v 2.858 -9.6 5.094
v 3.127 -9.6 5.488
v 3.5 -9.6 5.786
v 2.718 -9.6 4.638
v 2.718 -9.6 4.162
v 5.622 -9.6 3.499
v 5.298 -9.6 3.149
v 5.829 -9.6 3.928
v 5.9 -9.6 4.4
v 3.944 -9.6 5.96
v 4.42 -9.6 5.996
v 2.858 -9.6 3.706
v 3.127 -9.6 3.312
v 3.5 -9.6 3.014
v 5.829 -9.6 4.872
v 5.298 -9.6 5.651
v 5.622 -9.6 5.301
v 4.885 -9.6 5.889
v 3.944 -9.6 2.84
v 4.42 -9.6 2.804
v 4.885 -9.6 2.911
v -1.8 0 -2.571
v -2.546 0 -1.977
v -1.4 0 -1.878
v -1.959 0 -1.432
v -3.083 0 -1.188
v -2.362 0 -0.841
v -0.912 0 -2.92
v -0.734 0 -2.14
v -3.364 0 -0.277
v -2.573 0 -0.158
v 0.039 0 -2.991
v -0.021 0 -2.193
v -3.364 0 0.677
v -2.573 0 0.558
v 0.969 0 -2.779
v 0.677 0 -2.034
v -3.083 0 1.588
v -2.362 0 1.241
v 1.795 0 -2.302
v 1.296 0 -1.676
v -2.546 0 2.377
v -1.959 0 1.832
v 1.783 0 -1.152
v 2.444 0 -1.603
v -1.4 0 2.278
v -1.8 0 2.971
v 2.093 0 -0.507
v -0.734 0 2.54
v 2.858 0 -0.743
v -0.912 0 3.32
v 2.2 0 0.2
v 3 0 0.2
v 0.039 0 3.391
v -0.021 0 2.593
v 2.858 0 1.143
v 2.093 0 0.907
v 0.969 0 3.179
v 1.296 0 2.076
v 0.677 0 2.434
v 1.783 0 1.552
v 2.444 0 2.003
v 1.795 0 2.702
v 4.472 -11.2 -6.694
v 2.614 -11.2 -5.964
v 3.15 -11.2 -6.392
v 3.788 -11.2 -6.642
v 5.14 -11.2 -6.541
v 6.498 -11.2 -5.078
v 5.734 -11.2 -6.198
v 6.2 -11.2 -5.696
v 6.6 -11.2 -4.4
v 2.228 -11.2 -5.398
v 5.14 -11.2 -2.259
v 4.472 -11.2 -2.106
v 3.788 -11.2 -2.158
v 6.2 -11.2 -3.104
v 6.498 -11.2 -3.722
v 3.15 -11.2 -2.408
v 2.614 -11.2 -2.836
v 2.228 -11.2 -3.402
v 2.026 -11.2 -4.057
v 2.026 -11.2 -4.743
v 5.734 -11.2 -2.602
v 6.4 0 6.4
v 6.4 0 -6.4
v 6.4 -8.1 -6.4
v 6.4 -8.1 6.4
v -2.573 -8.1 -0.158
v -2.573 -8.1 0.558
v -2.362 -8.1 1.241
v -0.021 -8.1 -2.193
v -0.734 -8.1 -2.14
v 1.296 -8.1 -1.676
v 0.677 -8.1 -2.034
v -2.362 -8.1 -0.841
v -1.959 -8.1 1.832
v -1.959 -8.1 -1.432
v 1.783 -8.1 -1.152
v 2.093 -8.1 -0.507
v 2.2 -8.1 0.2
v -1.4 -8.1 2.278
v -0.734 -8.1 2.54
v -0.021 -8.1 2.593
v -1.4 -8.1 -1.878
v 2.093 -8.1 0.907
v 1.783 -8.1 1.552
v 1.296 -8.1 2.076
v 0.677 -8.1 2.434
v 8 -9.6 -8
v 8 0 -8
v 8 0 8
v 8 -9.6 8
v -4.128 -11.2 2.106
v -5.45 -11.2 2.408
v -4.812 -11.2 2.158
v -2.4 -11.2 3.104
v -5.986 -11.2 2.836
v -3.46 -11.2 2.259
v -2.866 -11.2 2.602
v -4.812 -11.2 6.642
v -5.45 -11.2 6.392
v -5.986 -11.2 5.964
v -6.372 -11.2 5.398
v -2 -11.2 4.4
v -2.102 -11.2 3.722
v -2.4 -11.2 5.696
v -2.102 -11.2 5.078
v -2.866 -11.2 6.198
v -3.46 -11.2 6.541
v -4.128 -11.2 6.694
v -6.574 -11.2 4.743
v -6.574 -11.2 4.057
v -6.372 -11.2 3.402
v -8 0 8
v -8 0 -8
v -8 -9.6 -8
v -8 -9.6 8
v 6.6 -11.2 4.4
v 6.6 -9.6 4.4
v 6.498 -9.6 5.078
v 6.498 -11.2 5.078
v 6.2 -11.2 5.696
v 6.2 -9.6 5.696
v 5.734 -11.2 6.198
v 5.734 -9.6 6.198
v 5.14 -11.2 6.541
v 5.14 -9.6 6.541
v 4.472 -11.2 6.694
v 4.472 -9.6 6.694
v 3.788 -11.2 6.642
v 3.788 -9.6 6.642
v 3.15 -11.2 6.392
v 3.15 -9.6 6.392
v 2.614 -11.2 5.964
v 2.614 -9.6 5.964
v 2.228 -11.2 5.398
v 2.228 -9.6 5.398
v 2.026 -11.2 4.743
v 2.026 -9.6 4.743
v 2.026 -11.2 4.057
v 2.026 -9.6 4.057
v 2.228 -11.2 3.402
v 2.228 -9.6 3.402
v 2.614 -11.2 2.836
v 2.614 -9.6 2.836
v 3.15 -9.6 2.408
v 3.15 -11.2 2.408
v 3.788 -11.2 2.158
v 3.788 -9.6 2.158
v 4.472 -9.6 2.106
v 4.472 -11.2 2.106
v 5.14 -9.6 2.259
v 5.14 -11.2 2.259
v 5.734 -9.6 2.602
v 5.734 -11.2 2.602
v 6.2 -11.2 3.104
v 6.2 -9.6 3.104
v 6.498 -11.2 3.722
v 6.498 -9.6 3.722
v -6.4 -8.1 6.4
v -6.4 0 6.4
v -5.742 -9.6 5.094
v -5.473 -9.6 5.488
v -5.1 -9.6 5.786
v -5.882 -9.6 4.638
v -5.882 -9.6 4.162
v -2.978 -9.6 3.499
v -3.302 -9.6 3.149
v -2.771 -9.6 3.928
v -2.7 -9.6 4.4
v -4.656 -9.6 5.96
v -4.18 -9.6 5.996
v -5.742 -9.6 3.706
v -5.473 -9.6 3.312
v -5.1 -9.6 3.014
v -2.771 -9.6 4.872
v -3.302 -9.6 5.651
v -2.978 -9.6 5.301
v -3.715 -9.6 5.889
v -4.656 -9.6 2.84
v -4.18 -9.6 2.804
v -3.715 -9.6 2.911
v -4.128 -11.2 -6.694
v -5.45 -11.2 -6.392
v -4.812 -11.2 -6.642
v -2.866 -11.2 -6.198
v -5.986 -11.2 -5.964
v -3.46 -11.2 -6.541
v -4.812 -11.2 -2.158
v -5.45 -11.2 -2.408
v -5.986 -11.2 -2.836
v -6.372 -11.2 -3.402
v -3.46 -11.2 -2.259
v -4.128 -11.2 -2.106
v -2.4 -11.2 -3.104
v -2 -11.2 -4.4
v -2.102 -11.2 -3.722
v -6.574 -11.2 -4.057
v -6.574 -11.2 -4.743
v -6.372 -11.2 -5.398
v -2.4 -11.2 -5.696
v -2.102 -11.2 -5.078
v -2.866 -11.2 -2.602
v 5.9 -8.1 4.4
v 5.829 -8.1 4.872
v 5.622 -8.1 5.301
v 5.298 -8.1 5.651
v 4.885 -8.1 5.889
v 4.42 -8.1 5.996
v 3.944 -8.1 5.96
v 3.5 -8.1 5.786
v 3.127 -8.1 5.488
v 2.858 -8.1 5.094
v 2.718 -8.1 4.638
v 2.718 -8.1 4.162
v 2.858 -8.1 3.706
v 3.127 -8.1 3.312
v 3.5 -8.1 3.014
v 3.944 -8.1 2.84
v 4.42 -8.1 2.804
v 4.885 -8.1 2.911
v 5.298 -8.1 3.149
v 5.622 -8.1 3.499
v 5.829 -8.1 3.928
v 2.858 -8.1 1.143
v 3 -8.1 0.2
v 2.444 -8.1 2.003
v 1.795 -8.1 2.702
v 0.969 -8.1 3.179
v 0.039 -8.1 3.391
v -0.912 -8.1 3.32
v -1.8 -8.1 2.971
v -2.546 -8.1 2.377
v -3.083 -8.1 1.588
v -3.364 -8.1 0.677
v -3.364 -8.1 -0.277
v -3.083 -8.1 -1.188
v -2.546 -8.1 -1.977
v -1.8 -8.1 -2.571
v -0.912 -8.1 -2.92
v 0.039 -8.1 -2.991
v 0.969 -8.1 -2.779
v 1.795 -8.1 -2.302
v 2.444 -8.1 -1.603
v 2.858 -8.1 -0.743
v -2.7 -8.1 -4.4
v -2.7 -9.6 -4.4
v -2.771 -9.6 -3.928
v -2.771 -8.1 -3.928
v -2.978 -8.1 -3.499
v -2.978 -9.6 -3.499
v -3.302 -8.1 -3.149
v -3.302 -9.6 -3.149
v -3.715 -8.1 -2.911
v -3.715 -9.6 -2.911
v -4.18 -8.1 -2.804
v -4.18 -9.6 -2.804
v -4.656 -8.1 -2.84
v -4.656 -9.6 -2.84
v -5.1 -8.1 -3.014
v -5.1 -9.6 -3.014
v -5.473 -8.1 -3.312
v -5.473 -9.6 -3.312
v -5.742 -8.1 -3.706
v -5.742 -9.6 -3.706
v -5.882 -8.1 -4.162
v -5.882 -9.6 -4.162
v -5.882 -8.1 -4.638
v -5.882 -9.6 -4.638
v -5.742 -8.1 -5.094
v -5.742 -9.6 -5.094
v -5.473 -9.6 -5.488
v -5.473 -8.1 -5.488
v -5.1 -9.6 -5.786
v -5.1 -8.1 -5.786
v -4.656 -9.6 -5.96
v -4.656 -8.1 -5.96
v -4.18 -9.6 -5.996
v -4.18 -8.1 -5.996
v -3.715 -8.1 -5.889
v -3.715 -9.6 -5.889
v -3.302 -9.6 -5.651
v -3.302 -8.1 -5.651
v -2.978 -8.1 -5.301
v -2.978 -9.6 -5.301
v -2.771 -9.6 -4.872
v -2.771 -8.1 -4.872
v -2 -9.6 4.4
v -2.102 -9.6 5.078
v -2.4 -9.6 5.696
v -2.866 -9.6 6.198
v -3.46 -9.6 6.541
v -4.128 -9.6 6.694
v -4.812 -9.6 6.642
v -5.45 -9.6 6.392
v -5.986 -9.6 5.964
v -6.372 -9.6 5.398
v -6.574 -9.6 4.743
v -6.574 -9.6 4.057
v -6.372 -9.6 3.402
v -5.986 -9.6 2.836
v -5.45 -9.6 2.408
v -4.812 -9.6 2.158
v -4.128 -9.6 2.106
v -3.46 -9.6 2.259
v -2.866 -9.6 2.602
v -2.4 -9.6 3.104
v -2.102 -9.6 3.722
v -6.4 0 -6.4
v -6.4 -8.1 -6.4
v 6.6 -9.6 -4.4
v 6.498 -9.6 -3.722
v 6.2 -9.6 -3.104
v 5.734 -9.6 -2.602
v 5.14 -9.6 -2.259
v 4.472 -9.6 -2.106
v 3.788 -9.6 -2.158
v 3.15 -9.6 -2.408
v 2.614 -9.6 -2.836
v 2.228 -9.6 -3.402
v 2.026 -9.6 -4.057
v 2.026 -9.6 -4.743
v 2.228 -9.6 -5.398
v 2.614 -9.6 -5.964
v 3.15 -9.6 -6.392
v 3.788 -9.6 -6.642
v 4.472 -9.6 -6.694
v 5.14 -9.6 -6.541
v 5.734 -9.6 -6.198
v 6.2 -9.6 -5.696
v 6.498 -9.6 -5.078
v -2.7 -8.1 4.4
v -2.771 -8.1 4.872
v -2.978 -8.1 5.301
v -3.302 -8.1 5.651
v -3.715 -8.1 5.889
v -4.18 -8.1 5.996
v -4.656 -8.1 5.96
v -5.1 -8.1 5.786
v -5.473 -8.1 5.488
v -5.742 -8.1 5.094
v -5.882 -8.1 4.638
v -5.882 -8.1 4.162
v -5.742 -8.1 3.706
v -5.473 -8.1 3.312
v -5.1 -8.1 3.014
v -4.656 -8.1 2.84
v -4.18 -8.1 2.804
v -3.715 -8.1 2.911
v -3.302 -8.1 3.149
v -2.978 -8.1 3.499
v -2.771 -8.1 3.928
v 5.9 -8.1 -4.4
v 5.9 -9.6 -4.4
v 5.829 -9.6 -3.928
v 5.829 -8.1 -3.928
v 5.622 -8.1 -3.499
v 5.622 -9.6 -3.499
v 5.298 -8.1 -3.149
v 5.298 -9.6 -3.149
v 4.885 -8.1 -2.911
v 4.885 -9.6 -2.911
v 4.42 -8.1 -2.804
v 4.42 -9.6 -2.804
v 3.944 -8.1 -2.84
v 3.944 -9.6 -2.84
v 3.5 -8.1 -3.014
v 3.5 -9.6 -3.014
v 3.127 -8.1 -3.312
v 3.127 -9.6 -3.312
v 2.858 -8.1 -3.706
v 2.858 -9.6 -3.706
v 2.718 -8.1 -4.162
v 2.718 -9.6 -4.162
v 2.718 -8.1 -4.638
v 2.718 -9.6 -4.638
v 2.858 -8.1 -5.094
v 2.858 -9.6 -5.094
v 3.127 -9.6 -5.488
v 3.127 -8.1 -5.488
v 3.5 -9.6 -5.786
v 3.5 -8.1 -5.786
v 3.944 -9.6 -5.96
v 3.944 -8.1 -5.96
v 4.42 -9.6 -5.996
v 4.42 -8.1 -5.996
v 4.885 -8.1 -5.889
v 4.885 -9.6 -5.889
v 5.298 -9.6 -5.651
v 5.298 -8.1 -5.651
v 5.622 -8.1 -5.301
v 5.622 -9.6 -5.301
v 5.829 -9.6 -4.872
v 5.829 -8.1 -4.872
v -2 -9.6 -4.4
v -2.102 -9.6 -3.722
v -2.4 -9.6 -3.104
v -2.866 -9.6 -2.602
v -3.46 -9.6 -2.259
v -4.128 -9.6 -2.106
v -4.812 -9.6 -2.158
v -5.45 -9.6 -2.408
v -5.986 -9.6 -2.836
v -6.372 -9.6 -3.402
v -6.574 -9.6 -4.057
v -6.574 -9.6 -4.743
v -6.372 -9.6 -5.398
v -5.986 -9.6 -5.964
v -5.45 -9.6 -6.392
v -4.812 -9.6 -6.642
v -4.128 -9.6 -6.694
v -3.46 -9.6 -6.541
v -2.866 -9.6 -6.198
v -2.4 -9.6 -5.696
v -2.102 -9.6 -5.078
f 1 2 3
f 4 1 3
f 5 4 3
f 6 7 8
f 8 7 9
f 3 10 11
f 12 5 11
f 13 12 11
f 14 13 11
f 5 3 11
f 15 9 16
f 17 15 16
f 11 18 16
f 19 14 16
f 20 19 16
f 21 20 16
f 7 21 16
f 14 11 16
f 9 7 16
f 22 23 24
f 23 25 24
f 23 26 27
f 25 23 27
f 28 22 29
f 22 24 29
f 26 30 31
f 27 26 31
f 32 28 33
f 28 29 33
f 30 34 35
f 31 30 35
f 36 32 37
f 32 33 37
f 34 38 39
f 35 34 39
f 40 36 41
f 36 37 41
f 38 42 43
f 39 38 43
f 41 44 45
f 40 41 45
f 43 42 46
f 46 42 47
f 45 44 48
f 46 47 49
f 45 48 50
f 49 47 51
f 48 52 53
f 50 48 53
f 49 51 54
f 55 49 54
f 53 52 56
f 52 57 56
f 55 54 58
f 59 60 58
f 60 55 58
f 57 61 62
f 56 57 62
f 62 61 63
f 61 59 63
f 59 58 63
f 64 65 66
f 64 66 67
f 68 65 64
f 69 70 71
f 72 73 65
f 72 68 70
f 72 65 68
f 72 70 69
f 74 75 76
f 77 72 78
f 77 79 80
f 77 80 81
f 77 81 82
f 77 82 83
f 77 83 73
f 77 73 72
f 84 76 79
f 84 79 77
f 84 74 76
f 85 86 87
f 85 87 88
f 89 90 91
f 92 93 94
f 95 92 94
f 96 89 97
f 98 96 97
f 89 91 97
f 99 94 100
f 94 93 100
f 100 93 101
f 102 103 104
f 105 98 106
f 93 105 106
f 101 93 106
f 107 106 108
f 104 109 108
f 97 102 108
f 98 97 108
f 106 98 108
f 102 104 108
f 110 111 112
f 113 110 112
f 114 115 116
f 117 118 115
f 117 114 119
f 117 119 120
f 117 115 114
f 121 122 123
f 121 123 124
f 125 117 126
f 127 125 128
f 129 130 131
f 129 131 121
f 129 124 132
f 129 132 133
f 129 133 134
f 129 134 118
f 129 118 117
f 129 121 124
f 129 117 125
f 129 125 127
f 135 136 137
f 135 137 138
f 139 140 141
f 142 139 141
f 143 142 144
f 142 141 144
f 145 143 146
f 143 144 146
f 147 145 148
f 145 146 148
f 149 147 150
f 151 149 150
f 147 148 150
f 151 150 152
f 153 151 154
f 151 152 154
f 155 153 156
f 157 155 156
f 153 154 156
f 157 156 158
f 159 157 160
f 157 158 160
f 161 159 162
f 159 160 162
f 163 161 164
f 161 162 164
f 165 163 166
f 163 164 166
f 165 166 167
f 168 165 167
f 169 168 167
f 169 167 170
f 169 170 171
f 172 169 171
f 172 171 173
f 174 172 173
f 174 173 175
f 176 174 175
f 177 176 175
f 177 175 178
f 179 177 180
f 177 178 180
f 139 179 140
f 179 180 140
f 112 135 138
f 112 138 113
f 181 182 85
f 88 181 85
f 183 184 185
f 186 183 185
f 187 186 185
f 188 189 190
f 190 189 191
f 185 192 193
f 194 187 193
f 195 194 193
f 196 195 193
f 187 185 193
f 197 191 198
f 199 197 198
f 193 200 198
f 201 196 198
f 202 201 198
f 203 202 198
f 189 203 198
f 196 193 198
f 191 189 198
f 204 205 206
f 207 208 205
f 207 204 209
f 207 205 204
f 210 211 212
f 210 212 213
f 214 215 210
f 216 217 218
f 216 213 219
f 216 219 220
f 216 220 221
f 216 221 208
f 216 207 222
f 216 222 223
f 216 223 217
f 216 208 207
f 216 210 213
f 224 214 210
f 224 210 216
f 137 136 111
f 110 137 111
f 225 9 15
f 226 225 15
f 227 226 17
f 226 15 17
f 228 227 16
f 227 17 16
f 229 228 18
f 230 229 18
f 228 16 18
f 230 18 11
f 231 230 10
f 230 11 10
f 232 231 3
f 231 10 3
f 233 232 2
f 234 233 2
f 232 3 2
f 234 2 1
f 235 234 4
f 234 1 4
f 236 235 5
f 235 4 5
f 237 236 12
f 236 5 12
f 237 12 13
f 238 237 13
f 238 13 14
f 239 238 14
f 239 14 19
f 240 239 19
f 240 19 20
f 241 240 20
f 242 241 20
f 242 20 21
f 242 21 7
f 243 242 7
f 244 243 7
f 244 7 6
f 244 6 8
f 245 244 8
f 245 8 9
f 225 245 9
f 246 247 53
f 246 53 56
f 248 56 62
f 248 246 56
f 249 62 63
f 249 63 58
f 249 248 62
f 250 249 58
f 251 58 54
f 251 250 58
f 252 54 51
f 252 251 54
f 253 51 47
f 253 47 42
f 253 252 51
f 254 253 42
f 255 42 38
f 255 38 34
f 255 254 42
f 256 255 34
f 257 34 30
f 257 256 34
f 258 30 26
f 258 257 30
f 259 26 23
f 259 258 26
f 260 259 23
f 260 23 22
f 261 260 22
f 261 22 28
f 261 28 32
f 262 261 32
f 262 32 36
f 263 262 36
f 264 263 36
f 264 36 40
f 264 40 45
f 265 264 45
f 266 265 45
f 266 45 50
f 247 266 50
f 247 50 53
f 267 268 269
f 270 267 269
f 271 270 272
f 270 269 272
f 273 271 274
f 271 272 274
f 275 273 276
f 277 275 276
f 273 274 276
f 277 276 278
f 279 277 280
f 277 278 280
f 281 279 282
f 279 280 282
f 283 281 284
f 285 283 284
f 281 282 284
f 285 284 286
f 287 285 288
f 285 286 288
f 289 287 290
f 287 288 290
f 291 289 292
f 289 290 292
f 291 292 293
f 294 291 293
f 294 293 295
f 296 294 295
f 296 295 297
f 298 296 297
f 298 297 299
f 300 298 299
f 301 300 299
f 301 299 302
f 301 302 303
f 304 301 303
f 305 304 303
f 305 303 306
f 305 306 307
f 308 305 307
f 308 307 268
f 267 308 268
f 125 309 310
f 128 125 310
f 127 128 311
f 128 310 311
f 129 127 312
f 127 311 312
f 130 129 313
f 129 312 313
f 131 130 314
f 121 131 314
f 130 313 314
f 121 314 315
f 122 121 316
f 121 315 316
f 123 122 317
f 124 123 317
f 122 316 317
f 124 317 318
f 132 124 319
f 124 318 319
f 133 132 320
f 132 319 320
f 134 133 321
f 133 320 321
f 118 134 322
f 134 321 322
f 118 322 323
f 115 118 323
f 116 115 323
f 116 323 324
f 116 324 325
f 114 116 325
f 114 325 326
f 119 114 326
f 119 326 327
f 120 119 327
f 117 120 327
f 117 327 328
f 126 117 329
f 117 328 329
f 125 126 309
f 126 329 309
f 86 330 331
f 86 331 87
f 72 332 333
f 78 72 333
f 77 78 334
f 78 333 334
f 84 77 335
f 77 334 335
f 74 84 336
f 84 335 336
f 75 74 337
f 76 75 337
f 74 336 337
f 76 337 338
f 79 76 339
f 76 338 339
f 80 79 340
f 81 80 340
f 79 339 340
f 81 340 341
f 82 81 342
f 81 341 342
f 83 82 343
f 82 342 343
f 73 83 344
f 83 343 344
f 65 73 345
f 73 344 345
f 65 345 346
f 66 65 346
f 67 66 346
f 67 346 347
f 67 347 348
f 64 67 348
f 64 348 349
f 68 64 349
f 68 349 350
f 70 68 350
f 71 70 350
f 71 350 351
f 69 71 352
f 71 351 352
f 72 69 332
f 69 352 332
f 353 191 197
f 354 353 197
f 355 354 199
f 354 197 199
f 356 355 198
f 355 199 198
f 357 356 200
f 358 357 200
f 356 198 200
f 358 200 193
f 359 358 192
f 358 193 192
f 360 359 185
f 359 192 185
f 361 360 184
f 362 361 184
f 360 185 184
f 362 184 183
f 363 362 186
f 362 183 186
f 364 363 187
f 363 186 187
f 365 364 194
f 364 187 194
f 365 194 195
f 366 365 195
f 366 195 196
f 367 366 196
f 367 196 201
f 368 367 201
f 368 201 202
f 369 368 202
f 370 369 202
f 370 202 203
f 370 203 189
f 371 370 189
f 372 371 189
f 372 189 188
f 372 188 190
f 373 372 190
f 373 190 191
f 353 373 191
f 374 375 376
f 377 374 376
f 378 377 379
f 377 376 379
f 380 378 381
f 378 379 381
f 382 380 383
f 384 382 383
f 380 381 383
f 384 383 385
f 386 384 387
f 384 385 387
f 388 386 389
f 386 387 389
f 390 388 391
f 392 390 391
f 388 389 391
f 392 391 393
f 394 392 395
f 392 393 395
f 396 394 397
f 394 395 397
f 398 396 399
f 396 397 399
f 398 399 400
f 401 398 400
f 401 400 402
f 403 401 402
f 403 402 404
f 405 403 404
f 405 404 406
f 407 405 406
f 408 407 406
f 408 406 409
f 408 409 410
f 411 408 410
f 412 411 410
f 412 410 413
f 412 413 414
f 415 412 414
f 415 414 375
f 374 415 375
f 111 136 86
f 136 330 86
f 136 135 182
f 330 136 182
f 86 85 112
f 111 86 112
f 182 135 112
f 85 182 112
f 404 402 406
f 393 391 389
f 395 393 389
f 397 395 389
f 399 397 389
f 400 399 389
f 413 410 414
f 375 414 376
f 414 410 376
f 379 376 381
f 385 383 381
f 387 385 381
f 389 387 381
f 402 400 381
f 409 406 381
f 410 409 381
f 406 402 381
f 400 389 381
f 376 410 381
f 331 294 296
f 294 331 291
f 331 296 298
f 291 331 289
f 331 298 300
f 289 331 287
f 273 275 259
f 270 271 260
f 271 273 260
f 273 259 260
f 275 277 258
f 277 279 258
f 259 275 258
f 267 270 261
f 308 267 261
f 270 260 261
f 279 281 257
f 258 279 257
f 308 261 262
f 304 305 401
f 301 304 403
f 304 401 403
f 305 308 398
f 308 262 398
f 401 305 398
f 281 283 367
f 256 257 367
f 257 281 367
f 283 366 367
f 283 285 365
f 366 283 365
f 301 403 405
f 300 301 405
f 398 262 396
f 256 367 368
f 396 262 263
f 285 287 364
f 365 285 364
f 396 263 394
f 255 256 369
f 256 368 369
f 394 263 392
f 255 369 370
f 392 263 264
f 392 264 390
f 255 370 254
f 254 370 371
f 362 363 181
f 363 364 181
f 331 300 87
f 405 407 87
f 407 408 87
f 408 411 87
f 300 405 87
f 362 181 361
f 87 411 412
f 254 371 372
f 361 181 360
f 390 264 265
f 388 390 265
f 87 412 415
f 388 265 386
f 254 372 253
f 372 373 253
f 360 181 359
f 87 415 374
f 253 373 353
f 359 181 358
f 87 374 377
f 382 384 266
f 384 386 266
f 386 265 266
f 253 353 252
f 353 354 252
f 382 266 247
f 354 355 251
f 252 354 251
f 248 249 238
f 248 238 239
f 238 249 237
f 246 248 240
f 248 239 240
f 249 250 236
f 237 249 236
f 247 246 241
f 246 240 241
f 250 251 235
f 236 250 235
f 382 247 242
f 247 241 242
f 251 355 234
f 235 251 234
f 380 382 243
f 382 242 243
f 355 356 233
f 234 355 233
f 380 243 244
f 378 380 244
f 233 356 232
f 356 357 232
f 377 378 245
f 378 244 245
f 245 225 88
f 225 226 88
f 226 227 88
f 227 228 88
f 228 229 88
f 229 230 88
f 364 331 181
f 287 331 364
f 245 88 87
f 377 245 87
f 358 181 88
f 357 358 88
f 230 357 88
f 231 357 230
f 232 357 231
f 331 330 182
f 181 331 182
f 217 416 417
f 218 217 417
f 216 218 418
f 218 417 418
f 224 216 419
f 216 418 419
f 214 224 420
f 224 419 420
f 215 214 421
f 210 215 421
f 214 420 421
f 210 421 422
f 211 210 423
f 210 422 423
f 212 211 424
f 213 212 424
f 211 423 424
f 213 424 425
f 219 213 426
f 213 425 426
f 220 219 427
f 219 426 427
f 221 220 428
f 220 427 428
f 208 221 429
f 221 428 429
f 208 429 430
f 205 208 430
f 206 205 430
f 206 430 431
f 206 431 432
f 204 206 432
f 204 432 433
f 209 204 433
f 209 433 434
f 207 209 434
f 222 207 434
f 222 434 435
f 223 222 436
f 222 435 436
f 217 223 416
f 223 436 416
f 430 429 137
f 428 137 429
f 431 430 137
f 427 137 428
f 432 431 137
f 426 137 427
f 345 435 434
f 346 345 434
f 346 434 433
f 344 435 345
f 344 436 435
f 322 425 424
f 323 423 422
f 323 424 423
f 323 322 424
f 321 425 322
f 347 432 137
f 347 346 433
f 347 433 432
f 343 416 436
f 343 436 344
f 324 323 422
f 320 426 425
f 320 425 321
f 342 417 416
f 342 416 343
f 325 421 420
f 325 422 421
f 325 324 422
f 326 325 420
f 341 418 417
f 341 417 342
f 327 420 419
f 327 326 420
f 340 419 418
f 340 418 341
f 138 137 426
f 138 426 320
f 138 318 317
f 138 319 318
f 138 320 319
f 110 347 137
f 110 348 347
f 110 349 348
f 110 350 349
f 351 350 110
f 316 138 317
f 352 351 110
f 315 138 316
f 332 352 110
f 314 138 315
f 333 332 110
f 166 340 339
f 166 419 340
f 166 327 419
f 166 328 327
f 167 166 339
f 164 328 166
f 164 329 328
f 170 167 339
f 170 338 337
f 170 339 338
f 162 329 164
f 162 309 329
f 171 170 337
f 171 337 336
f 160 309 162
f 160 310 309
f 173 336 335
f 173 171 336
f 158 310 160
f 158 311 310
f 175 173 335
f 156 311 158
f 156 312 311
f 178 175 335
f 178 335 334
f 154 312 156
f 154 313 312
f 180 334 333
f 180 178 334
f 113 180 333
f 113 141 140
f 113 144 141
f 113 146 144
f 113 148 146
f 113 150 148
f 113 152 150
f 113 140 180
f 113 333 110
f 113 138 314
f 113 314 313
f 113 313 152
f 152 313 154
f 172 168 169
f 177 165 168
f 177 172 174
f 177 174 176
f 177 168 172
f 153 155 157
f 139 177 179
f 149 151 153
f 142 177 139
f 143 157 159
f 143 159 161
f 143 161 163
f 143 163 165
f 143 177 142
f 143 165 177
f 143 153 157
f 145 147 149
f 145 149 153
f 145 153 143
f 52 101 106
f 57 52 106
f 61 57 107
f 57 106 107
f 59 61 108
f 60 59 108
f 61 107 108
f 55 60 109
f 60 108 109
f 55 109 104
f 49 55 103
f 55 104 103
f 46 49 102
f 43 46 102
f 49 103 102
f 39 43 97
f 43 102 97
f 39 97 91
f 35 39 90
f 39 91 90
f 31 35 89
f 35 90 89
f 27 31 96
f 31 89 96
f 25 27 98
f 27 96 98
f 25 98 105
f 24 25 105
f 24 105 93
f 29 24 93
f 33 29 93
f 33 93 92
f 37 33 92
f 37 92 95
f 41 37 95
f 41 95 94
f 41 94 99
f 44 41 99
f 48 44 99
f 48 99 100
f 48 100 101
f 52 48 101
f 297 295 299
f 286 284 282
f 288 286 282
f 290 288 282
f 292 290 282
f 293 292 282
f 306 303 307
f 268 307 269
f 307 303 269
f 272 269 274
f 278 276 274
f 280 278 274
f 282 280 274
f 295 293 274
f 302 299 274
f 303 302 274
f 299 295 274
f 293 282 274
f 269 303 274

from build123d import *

# Parameters (mm, degrees)
F0_W     = 16
F0_H     = 16
F0_W_2   = 12.8
F0_H_2   = 12.8
F1_DEPTH = 9.6
F2_DEPTH = 8.1
F3_R     = 1.6
F4_DEPTH = 1.6
F5_R     = 2.3
F6_DEPTH = 1.6
F7_R     = 3.2
F7_R_2   = 2.4
F8_DEPTH = 9.6


with BuildPart() as f1:
    # F0 (on Front) → F1 (new body)
    with BuildSketch(Plane.XZ):
        Rectangle(F0_W, F0_H)
        Rectangle(F0_W_2, F0_H_2, mode=Mode.SUBTRACT)
        Rectangle(F0_W_2, F0_H_2)
    extrude(amount=F1_DEPTH)

    # F0 (on Front) → F2 (cut)
    with BuildSketch(Plane.XZ):
        Rectangle(F0_W_2, F0_H_2)
    extrude(amount=F2_DEPTH, mode=Mode.SUBTRACT)

    # F3 (on face) → F4 (cut)
    with BuildSketch(Plane.XZ.offset(9.6)):
        with Locations((-4.3, 4.4)):
            Circle(F3_R)
        with Locations((-4.3, -4.4)):
            Circle(F3_R)
        with Locations((4.3, 4.4)):
            Circle(F3_R)
        with Locations((4.3, -4.4)):
            Circle(F3_R)
    extrude(amount=-F4_DEPTH, mode=Mode.SUBTRACT)

    # F5 (on face) → F6 (join)
    with BuildSketch(Plane.XZ.offset(9.6)):
        with Locations((-4.3, 4.4)):
            Circle(F5_R)
        with Locations((-4.3, -4.4)):
            Circle(F5_R)
        with Locations((4.3, 4.4)):
            Circle(F5_R)
        with Locations((4.3, -4.4)):
            Circle(F5_R)
    extrude(amount=F6_DEPTH)

    # F7 (on face) → F8 (join)
    with BuildSketch(Plane.XZ.offset(9.6)):
        with Locations((-0.2, 0.2)):
            Circle(F7_R)
        with Locations((-0.2, 0.2)):
            Circle(F7_R_2, mode=Mode.SUBTRACT)
    extrude(amount=-F8_DEPTH)


solid = f1.part
